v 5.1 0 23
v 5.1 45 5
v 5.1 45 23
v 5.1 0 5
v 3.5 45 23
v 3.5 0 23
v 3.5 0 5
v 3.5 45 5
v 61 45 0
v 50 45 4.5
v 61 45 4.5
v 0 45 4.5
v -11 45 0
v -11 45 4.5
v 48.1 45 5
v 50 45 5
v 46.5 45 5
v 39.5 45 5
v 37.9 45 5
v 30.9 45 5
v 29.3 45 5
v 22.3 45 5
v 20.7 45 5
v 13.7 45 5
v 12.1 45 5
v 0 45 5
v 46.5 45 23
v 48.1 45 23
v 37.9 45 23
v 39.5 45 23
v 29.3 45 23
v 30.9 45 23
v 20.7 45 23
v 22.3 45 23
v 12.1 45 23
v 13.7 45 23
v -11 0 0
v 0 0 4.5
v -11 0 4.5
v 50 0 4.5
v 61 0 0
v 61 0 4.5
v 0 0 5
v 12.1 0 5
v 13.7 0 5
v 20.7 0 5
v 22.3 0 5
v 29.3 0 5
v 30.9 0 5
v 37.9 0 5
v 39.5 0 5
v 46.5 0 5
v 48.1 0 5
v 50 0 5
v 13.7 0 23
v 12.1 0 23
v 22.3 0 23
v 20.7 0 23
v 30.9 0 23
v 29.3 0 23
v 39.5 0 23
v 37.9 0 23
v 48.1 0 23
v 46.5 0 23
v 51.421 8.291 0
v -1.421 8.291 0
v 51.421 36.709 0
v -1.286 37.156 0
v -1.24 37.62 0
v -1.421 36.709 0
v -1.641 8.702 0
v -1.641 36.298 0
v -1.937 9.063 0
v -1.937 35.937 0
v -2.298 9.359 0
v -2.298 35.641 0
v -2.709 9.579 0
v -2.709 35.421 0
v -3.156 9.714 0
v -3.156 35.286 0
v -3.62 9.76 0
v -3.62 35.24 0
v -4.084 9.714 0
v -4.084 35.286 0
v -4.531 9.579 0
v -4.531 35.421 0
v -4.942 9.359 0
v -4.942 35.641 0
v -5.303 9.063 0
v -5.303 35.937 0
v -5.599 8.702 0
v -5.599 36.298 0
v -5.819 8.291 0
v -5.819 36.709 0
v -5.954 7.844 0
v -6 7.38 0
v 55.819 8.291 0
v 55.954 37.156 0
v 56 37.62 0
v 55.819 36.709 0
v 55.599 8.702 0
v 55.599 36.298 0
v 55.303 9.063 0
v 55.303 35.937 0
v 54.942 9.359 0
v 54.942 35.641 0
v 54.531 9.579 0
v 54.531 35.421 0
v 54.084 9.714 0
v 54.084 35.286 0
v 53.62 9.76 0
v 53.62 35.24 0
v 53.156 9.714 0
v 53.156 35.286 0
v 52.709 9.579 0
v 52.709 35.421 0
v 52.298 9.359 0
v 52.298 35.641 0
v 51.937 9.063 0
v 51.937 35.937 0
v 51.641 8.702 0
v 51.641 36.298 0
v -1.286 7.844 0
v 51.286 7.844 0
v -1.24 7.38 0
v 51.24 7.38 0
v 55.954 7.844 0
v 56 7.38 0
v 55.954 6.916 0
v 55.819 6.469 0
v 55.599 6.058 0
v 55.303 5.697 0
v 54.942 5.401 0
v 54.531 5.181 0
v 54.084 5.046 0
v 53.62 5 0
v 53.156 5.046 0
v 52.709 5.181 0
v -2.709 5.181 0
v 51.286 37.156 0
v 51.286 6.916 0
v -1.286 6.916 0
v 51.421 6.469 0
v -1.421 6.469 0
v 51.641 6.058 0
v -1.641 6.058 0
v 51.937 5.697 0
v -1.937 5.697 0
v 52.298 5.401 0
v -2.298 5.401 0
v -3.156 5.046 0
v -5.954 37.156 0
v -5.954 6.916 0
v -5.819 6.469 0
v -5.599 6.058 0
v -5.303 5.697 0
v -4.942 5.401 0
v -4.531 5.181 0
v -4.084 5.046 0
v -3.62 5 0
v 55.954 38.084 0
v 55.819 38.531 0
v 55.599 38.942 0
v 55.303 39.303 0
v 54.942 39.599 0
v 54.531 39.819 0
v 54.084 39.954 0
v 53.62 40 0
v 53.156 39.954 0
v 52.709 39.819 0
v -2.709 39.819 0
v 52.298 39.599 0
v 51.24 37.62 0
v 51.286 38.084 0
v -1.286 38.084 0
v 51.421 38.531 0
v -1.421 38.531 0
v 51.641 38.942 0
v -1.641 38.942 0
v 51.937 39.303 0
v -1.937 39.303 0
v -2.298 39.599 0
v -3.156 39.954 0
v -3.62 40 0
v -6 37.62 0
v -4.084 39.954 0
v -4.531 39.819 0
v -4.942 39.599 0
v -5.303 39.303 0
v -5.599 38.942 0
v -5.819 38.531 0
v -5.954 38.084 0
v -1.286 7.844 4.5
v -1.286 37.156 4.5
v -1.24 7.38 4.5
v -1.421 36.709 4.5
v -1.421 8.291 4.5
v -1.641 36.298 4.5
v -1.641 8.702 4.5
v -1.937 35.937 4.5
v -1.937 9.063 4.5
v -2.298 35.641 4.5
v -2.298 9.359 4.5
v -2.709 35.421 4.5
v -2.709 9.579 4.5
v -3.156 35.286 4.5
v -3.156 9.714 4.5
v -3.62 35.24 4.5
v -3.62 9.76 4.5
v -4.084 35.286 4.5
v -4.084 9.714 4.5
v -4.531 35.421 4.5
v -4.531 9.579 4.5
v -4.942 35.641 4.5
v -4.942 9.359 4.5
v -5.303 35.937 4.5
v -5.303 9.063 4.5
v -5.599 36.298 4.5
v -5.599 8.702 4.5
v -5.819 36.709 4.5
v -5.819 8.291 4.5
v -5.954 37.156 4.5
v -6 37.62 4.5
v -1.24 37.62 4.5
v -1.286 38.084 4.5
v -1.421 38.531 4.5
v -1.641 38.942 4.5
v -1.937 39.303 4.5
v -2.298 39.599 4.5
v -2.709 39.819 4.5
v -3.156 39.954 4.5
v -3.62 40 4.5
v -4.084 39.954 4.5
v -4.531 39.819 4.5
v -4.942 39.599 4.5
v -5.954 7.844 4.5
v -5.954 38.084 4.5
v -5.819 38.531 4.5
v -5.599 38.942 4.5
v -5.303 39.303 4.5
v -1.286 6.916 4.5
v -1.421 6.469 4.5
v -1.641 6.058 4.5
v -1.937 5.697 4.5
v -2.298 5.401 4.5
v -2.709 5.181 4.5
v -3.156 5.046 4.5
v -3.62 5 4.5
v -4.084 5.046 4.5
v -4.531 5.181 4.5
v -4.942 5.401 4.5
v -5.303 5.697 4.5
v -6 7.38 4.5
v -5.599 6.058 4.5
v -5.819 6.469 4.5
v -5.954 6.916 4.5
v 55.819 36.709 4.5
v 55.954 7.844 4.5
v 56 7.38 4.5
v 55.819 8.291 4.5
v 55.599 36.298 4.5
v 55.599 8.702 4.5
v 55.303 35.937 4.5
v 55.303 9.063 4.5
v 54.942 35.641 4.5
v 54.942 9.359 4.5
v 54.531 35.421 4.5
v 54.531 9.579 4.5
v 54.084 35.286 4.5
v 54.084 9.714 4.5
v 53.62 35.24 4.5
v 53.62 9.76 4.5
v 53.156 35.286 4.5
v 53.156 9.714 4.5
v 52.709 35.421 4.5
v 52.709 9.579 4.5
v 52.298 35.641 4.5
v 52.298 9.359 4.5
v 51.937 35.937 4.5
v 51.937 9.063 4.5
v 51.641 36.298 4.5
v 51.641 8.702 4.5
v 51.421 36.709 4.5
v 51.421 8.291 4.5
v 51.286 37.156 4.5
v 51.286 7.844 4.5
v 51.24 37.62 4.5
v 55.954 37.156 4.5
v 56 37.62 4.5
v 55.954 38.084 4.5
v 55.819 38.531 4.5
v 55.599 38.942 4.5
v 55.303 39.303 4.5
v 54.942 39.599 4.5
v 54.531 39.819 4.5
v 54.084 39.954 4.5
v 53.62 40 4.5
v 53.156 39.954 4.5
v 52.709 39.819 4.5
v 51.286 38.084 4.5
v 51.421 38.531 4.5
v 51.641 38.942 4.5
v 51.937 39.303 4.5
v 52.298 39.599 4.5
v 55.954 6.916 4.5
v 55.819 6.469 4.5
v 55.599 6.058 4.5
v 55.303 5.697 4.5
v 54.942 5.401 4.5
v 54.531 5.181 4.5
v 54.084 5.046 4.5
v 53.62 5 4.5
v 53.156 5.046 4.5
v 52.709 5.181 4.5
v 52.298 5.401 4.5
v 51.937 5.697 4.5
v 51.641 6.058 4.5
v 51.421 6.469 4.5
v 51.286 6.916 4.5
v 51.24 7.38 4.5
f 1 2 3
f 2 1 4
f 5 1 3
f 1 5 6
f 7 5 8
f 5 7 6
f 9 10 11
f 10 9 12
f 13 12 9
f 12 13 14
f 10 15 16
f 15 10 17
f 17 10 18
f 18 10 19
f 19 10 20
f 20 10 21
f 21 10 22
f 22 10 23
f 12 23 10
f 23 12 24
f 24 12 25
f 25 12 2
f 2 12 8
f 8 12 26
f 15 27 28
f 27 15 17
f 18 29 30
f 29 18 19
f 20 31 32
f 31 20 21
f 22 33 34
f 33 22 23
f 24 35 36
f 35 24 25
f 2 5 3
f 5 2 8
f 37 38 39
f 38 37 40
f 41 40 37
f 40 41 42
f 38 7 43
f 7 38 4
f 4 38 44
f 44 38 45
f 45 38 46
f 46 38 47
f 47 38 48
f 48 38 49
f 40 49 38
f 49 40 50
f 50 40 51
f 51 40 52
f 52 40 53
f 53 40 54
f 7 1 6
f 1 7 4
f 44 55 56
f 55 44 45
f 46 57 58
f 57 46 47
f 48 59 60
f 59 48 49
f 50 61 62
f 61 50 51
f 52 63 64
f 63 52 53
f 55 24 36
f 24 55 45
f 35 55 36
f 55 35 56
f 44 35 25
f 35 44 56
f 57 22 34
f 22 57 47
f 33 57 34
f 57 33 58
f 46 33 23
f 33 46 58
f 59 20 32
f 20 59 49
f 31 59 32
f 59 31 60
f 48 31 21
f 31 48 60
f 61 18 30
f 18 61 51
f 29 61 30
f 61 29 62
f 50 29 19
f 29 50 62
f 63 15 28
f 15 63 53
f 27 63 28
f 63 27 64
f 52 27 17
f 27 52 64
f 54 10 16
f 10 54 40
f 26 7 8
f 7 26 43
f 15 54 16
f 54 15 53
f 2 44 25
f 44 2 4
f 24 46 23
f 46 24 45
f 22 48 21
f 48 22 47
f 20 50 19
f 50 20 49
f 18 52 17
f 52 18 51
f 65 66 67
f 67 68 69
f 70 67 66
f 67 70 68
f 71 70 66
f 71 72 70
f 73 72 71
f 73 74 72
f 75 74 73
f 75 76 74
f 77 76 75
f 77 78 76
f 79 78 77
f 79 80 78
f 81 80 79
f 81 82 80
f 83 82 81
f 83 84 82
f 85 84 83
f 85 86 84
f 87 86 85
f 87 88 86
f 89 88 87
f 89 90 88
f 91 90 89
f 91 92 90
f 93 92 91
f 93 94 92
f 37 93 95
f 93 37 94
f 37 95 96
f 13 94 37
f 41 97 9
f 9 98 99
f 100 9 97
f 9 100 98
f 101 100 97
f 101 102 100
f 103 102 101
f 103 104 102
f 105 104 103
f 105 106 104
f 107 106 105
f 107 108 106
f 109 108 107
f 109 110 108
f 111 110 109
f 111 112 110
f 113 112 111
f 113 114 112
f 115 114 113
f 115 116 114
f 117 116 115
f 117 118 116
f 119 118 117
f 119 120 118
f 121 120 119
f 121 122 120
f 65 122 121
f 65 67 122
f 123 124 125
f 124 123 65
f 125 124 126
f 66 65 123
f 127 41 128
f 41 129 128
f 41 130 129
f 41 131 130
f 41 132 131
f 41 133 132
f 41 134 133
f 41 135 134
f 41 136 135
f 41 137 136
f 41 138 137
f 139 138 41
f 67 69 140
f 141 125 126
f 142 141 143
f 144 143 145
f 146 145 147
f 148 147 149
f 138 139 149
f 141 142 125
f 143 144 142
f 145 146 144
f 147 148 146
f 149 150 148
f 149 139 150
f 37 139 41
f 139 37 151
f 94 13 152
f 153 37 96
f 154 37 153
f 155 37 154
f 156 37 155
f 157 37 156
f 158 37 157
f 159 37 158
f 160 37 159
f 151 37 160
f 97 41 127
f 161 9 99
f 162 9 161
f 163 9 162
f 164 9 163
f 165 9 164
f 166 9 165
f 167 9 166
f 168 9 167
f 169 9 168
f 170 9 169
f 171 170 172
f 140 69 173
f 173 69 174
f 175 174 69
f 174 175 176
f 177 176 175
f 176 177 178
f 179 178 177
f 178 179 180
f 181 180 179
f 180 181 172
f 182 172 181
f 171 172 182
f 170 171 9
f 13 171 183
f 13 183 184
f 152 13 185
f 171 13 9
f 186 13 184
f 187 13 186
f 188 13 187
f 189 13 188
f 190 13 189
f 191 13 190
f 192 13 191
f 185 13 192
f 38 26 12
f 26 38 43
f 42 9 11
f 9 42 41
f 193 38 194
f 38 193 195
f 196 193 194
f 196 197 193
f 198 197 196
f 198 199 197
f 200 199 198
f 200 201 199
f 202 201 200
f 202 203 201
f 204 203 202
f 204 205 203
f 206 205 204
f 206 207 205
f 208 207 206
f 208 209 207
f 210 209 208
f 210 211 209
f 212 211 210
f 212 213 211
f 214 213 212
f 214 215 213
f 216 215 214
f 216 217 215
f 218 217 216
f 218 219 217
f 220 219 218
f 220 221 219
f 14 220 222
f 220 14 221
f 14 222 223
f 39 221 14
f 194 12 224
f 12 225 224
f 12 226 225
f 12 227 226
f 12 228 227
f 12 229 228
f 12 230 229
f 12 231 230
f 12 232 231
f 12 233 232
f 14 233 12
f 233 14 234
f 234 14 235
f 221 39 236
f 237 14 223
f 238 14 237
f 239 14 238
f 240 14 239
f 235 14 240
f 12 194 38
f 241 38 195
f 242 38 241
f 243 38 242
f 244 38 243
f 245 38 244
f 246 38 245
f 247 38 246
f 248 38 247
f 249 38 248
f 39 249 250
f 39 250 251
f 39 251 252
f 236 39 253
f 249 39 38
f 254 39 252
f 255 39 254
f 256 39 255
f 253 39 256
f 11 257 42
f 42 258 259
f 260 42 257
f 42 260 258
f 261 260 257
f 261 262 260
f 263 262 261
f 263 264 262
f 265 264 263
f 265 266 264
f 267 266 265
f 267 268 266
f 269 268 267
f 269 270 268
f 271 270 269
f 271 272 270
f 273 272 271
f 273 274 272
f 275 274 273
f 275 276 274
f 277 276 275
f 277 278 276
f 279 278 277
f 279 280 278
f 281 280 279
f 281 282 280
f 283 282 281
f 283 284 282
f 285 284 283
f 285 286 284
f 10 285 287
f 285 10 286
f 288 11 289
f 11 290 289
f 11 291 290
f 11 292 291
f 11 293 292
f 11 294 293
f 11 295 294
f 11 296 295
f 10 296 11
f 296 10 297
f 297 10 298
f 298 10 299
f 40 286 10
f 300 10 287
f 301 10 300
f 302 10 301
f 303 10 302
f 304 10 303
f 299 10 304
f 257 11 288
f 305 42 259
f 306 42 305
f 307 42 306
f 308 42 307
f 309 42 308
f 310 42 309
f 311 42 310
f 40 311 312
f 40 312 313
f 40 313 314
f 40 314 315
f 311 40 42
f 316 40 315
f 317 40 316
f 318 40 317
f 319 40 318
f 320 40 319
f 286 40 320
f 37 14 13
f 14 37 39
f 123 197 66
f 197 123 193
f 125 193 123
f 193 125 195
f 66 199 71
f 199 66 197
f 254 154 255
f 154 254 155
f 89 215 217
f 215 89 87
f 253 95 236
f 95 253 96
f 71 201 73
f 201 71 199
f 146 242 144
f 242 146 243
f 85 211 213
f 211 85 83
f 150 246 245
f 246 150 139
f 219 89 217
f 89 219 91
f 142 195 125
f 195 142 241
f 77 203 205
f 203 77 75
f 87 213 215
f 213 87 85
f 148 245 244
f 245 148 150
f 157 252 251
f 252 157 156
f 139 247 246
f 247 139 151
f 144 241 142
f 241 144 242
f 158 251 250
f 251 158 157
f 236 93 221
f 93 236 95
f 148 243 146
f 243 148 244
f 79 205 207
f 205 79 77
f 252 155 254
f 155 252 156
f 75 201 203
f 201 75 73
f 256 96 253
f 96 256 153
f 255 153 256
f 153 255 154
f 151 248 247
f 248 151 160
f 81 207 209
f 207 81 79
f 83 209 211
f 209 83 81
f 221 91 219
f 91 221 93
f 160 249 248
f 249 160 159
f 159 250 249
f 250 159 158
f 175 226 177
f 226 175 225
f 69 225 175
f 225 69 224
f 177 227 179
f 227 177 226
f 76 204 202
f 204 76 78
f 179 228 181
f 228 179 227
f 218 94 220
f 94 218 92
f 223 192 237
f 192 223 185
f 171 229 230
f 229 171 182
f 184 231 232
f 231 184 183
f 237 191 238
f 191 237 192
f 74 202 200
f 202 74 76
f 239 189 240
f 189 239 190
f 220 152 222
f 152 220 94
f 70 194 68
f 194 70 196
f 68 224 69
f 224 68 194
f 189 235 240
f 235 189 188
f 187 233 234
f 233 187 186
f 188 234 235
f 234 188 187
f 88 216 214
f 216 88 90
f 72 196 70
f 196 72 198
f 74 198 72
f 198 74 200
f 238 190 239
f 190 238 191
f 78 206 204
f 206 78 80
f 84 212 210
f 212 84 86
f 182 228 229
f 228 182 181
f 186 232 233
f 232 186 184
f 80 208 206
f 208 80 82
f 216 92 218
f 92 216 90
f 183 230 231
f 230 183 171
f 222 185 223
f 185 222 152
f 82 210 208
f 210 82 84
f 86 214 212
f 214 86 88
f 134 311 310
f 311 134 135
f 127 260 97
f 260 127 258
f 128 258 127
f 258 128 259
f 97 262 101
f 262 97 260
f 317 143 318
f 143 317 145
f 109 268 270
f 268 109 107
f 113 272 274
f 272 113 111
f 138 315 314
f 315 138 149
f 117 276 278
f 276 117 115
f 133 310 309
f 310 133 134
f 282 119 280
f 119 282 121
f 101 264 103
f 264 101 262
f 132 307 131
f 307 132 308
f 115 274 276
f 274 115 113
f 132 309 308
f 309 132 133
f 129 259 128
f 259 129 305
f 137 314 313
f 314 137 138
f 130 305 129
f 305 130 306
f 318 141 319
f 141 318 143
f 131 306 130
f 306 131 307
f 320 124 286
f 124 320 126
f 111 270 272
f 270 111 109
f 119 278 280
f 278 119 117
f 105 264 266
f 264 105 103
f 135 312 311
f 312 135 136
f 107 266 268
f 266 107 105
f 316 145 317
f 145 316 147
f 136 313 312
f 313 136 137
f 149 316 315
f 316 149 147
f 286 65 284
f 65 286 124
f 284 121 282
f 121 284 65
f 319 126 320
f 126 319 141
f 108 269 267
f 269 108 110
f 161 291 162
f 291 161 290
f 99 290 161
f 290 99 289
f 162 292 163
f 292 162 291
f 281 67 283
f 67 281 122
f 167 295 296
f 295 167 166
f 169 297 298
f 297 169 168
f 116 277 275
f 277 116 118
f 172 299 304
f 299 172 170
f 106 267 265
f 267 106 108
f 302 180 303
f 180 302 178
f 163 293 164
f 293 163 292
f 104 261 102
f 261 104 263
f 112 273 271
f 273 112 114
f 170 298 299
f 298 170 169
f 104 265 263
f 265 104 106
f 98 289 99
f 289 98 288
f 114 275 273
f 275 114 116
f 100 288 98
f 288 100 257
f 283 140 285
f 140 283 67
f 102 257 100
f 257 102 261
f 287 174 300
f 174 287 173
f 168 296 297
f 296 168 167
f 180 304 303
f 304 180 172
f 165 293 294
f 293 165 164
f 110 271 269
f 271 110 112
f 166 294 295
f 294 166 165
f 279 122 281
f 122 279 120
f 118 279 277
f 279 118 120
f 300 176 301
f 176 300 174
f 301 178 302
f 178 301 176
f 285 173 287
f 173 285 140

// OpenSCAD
$fn = 32;

// ----------------------------------------------------------------------
// Finned heat sink: 50 x 45 mm base, 18 mm fins
// ----------------------------------------------------------------------

// --- parameters (mm) ---
base_w = 50;              // base width
base_d = 45;              // base depth
base_t = 5;               // base thickness
fin_h = 18;               // fin height above the base
holes_d = 4.76;           // fixing holes
hole_x = 28.62;           // hole offset in x
hole_y = 15.12;           // hole offset in y
fin_t = 1.6;              // fin thickness
fin_pitch = 8.6;          // fin pitch
fin_count = 6;            // number of fins
fin_x0 = 3.5;             // first fin offset
flange_w = 72;            // flange plate width
flange_t = 4;             // flange plate thickness

difference() {
  union() {
    cube([base_w, base_d, base_t]);
    for (i = [0 : fin_count - 1]) {
      translate([fin_x0 + i * fin_pitch, 0, base_t - 0.5]) cube([fin_t, base_d, fin_h + 0.5]);
    }
    /* mounting flange, a wider plate sharing the base bottom */
    translate([(base_w - flange_w) / 2, 0, 0]) cube([flange_w, base_d, flange_t + 0.5]);
  }
  /* fixing holes through the base, 2.5 mm clear on both sides */
  for (hx = [-28.62, 28.62]) {
    for (hy = [-15.12, 15.12]) {
      translate([base_w / 2 + hx, base_d / 2 + hy, -2.5]) cylinder(h = base_t + 5, d = holes_d);
    }
  }
}
